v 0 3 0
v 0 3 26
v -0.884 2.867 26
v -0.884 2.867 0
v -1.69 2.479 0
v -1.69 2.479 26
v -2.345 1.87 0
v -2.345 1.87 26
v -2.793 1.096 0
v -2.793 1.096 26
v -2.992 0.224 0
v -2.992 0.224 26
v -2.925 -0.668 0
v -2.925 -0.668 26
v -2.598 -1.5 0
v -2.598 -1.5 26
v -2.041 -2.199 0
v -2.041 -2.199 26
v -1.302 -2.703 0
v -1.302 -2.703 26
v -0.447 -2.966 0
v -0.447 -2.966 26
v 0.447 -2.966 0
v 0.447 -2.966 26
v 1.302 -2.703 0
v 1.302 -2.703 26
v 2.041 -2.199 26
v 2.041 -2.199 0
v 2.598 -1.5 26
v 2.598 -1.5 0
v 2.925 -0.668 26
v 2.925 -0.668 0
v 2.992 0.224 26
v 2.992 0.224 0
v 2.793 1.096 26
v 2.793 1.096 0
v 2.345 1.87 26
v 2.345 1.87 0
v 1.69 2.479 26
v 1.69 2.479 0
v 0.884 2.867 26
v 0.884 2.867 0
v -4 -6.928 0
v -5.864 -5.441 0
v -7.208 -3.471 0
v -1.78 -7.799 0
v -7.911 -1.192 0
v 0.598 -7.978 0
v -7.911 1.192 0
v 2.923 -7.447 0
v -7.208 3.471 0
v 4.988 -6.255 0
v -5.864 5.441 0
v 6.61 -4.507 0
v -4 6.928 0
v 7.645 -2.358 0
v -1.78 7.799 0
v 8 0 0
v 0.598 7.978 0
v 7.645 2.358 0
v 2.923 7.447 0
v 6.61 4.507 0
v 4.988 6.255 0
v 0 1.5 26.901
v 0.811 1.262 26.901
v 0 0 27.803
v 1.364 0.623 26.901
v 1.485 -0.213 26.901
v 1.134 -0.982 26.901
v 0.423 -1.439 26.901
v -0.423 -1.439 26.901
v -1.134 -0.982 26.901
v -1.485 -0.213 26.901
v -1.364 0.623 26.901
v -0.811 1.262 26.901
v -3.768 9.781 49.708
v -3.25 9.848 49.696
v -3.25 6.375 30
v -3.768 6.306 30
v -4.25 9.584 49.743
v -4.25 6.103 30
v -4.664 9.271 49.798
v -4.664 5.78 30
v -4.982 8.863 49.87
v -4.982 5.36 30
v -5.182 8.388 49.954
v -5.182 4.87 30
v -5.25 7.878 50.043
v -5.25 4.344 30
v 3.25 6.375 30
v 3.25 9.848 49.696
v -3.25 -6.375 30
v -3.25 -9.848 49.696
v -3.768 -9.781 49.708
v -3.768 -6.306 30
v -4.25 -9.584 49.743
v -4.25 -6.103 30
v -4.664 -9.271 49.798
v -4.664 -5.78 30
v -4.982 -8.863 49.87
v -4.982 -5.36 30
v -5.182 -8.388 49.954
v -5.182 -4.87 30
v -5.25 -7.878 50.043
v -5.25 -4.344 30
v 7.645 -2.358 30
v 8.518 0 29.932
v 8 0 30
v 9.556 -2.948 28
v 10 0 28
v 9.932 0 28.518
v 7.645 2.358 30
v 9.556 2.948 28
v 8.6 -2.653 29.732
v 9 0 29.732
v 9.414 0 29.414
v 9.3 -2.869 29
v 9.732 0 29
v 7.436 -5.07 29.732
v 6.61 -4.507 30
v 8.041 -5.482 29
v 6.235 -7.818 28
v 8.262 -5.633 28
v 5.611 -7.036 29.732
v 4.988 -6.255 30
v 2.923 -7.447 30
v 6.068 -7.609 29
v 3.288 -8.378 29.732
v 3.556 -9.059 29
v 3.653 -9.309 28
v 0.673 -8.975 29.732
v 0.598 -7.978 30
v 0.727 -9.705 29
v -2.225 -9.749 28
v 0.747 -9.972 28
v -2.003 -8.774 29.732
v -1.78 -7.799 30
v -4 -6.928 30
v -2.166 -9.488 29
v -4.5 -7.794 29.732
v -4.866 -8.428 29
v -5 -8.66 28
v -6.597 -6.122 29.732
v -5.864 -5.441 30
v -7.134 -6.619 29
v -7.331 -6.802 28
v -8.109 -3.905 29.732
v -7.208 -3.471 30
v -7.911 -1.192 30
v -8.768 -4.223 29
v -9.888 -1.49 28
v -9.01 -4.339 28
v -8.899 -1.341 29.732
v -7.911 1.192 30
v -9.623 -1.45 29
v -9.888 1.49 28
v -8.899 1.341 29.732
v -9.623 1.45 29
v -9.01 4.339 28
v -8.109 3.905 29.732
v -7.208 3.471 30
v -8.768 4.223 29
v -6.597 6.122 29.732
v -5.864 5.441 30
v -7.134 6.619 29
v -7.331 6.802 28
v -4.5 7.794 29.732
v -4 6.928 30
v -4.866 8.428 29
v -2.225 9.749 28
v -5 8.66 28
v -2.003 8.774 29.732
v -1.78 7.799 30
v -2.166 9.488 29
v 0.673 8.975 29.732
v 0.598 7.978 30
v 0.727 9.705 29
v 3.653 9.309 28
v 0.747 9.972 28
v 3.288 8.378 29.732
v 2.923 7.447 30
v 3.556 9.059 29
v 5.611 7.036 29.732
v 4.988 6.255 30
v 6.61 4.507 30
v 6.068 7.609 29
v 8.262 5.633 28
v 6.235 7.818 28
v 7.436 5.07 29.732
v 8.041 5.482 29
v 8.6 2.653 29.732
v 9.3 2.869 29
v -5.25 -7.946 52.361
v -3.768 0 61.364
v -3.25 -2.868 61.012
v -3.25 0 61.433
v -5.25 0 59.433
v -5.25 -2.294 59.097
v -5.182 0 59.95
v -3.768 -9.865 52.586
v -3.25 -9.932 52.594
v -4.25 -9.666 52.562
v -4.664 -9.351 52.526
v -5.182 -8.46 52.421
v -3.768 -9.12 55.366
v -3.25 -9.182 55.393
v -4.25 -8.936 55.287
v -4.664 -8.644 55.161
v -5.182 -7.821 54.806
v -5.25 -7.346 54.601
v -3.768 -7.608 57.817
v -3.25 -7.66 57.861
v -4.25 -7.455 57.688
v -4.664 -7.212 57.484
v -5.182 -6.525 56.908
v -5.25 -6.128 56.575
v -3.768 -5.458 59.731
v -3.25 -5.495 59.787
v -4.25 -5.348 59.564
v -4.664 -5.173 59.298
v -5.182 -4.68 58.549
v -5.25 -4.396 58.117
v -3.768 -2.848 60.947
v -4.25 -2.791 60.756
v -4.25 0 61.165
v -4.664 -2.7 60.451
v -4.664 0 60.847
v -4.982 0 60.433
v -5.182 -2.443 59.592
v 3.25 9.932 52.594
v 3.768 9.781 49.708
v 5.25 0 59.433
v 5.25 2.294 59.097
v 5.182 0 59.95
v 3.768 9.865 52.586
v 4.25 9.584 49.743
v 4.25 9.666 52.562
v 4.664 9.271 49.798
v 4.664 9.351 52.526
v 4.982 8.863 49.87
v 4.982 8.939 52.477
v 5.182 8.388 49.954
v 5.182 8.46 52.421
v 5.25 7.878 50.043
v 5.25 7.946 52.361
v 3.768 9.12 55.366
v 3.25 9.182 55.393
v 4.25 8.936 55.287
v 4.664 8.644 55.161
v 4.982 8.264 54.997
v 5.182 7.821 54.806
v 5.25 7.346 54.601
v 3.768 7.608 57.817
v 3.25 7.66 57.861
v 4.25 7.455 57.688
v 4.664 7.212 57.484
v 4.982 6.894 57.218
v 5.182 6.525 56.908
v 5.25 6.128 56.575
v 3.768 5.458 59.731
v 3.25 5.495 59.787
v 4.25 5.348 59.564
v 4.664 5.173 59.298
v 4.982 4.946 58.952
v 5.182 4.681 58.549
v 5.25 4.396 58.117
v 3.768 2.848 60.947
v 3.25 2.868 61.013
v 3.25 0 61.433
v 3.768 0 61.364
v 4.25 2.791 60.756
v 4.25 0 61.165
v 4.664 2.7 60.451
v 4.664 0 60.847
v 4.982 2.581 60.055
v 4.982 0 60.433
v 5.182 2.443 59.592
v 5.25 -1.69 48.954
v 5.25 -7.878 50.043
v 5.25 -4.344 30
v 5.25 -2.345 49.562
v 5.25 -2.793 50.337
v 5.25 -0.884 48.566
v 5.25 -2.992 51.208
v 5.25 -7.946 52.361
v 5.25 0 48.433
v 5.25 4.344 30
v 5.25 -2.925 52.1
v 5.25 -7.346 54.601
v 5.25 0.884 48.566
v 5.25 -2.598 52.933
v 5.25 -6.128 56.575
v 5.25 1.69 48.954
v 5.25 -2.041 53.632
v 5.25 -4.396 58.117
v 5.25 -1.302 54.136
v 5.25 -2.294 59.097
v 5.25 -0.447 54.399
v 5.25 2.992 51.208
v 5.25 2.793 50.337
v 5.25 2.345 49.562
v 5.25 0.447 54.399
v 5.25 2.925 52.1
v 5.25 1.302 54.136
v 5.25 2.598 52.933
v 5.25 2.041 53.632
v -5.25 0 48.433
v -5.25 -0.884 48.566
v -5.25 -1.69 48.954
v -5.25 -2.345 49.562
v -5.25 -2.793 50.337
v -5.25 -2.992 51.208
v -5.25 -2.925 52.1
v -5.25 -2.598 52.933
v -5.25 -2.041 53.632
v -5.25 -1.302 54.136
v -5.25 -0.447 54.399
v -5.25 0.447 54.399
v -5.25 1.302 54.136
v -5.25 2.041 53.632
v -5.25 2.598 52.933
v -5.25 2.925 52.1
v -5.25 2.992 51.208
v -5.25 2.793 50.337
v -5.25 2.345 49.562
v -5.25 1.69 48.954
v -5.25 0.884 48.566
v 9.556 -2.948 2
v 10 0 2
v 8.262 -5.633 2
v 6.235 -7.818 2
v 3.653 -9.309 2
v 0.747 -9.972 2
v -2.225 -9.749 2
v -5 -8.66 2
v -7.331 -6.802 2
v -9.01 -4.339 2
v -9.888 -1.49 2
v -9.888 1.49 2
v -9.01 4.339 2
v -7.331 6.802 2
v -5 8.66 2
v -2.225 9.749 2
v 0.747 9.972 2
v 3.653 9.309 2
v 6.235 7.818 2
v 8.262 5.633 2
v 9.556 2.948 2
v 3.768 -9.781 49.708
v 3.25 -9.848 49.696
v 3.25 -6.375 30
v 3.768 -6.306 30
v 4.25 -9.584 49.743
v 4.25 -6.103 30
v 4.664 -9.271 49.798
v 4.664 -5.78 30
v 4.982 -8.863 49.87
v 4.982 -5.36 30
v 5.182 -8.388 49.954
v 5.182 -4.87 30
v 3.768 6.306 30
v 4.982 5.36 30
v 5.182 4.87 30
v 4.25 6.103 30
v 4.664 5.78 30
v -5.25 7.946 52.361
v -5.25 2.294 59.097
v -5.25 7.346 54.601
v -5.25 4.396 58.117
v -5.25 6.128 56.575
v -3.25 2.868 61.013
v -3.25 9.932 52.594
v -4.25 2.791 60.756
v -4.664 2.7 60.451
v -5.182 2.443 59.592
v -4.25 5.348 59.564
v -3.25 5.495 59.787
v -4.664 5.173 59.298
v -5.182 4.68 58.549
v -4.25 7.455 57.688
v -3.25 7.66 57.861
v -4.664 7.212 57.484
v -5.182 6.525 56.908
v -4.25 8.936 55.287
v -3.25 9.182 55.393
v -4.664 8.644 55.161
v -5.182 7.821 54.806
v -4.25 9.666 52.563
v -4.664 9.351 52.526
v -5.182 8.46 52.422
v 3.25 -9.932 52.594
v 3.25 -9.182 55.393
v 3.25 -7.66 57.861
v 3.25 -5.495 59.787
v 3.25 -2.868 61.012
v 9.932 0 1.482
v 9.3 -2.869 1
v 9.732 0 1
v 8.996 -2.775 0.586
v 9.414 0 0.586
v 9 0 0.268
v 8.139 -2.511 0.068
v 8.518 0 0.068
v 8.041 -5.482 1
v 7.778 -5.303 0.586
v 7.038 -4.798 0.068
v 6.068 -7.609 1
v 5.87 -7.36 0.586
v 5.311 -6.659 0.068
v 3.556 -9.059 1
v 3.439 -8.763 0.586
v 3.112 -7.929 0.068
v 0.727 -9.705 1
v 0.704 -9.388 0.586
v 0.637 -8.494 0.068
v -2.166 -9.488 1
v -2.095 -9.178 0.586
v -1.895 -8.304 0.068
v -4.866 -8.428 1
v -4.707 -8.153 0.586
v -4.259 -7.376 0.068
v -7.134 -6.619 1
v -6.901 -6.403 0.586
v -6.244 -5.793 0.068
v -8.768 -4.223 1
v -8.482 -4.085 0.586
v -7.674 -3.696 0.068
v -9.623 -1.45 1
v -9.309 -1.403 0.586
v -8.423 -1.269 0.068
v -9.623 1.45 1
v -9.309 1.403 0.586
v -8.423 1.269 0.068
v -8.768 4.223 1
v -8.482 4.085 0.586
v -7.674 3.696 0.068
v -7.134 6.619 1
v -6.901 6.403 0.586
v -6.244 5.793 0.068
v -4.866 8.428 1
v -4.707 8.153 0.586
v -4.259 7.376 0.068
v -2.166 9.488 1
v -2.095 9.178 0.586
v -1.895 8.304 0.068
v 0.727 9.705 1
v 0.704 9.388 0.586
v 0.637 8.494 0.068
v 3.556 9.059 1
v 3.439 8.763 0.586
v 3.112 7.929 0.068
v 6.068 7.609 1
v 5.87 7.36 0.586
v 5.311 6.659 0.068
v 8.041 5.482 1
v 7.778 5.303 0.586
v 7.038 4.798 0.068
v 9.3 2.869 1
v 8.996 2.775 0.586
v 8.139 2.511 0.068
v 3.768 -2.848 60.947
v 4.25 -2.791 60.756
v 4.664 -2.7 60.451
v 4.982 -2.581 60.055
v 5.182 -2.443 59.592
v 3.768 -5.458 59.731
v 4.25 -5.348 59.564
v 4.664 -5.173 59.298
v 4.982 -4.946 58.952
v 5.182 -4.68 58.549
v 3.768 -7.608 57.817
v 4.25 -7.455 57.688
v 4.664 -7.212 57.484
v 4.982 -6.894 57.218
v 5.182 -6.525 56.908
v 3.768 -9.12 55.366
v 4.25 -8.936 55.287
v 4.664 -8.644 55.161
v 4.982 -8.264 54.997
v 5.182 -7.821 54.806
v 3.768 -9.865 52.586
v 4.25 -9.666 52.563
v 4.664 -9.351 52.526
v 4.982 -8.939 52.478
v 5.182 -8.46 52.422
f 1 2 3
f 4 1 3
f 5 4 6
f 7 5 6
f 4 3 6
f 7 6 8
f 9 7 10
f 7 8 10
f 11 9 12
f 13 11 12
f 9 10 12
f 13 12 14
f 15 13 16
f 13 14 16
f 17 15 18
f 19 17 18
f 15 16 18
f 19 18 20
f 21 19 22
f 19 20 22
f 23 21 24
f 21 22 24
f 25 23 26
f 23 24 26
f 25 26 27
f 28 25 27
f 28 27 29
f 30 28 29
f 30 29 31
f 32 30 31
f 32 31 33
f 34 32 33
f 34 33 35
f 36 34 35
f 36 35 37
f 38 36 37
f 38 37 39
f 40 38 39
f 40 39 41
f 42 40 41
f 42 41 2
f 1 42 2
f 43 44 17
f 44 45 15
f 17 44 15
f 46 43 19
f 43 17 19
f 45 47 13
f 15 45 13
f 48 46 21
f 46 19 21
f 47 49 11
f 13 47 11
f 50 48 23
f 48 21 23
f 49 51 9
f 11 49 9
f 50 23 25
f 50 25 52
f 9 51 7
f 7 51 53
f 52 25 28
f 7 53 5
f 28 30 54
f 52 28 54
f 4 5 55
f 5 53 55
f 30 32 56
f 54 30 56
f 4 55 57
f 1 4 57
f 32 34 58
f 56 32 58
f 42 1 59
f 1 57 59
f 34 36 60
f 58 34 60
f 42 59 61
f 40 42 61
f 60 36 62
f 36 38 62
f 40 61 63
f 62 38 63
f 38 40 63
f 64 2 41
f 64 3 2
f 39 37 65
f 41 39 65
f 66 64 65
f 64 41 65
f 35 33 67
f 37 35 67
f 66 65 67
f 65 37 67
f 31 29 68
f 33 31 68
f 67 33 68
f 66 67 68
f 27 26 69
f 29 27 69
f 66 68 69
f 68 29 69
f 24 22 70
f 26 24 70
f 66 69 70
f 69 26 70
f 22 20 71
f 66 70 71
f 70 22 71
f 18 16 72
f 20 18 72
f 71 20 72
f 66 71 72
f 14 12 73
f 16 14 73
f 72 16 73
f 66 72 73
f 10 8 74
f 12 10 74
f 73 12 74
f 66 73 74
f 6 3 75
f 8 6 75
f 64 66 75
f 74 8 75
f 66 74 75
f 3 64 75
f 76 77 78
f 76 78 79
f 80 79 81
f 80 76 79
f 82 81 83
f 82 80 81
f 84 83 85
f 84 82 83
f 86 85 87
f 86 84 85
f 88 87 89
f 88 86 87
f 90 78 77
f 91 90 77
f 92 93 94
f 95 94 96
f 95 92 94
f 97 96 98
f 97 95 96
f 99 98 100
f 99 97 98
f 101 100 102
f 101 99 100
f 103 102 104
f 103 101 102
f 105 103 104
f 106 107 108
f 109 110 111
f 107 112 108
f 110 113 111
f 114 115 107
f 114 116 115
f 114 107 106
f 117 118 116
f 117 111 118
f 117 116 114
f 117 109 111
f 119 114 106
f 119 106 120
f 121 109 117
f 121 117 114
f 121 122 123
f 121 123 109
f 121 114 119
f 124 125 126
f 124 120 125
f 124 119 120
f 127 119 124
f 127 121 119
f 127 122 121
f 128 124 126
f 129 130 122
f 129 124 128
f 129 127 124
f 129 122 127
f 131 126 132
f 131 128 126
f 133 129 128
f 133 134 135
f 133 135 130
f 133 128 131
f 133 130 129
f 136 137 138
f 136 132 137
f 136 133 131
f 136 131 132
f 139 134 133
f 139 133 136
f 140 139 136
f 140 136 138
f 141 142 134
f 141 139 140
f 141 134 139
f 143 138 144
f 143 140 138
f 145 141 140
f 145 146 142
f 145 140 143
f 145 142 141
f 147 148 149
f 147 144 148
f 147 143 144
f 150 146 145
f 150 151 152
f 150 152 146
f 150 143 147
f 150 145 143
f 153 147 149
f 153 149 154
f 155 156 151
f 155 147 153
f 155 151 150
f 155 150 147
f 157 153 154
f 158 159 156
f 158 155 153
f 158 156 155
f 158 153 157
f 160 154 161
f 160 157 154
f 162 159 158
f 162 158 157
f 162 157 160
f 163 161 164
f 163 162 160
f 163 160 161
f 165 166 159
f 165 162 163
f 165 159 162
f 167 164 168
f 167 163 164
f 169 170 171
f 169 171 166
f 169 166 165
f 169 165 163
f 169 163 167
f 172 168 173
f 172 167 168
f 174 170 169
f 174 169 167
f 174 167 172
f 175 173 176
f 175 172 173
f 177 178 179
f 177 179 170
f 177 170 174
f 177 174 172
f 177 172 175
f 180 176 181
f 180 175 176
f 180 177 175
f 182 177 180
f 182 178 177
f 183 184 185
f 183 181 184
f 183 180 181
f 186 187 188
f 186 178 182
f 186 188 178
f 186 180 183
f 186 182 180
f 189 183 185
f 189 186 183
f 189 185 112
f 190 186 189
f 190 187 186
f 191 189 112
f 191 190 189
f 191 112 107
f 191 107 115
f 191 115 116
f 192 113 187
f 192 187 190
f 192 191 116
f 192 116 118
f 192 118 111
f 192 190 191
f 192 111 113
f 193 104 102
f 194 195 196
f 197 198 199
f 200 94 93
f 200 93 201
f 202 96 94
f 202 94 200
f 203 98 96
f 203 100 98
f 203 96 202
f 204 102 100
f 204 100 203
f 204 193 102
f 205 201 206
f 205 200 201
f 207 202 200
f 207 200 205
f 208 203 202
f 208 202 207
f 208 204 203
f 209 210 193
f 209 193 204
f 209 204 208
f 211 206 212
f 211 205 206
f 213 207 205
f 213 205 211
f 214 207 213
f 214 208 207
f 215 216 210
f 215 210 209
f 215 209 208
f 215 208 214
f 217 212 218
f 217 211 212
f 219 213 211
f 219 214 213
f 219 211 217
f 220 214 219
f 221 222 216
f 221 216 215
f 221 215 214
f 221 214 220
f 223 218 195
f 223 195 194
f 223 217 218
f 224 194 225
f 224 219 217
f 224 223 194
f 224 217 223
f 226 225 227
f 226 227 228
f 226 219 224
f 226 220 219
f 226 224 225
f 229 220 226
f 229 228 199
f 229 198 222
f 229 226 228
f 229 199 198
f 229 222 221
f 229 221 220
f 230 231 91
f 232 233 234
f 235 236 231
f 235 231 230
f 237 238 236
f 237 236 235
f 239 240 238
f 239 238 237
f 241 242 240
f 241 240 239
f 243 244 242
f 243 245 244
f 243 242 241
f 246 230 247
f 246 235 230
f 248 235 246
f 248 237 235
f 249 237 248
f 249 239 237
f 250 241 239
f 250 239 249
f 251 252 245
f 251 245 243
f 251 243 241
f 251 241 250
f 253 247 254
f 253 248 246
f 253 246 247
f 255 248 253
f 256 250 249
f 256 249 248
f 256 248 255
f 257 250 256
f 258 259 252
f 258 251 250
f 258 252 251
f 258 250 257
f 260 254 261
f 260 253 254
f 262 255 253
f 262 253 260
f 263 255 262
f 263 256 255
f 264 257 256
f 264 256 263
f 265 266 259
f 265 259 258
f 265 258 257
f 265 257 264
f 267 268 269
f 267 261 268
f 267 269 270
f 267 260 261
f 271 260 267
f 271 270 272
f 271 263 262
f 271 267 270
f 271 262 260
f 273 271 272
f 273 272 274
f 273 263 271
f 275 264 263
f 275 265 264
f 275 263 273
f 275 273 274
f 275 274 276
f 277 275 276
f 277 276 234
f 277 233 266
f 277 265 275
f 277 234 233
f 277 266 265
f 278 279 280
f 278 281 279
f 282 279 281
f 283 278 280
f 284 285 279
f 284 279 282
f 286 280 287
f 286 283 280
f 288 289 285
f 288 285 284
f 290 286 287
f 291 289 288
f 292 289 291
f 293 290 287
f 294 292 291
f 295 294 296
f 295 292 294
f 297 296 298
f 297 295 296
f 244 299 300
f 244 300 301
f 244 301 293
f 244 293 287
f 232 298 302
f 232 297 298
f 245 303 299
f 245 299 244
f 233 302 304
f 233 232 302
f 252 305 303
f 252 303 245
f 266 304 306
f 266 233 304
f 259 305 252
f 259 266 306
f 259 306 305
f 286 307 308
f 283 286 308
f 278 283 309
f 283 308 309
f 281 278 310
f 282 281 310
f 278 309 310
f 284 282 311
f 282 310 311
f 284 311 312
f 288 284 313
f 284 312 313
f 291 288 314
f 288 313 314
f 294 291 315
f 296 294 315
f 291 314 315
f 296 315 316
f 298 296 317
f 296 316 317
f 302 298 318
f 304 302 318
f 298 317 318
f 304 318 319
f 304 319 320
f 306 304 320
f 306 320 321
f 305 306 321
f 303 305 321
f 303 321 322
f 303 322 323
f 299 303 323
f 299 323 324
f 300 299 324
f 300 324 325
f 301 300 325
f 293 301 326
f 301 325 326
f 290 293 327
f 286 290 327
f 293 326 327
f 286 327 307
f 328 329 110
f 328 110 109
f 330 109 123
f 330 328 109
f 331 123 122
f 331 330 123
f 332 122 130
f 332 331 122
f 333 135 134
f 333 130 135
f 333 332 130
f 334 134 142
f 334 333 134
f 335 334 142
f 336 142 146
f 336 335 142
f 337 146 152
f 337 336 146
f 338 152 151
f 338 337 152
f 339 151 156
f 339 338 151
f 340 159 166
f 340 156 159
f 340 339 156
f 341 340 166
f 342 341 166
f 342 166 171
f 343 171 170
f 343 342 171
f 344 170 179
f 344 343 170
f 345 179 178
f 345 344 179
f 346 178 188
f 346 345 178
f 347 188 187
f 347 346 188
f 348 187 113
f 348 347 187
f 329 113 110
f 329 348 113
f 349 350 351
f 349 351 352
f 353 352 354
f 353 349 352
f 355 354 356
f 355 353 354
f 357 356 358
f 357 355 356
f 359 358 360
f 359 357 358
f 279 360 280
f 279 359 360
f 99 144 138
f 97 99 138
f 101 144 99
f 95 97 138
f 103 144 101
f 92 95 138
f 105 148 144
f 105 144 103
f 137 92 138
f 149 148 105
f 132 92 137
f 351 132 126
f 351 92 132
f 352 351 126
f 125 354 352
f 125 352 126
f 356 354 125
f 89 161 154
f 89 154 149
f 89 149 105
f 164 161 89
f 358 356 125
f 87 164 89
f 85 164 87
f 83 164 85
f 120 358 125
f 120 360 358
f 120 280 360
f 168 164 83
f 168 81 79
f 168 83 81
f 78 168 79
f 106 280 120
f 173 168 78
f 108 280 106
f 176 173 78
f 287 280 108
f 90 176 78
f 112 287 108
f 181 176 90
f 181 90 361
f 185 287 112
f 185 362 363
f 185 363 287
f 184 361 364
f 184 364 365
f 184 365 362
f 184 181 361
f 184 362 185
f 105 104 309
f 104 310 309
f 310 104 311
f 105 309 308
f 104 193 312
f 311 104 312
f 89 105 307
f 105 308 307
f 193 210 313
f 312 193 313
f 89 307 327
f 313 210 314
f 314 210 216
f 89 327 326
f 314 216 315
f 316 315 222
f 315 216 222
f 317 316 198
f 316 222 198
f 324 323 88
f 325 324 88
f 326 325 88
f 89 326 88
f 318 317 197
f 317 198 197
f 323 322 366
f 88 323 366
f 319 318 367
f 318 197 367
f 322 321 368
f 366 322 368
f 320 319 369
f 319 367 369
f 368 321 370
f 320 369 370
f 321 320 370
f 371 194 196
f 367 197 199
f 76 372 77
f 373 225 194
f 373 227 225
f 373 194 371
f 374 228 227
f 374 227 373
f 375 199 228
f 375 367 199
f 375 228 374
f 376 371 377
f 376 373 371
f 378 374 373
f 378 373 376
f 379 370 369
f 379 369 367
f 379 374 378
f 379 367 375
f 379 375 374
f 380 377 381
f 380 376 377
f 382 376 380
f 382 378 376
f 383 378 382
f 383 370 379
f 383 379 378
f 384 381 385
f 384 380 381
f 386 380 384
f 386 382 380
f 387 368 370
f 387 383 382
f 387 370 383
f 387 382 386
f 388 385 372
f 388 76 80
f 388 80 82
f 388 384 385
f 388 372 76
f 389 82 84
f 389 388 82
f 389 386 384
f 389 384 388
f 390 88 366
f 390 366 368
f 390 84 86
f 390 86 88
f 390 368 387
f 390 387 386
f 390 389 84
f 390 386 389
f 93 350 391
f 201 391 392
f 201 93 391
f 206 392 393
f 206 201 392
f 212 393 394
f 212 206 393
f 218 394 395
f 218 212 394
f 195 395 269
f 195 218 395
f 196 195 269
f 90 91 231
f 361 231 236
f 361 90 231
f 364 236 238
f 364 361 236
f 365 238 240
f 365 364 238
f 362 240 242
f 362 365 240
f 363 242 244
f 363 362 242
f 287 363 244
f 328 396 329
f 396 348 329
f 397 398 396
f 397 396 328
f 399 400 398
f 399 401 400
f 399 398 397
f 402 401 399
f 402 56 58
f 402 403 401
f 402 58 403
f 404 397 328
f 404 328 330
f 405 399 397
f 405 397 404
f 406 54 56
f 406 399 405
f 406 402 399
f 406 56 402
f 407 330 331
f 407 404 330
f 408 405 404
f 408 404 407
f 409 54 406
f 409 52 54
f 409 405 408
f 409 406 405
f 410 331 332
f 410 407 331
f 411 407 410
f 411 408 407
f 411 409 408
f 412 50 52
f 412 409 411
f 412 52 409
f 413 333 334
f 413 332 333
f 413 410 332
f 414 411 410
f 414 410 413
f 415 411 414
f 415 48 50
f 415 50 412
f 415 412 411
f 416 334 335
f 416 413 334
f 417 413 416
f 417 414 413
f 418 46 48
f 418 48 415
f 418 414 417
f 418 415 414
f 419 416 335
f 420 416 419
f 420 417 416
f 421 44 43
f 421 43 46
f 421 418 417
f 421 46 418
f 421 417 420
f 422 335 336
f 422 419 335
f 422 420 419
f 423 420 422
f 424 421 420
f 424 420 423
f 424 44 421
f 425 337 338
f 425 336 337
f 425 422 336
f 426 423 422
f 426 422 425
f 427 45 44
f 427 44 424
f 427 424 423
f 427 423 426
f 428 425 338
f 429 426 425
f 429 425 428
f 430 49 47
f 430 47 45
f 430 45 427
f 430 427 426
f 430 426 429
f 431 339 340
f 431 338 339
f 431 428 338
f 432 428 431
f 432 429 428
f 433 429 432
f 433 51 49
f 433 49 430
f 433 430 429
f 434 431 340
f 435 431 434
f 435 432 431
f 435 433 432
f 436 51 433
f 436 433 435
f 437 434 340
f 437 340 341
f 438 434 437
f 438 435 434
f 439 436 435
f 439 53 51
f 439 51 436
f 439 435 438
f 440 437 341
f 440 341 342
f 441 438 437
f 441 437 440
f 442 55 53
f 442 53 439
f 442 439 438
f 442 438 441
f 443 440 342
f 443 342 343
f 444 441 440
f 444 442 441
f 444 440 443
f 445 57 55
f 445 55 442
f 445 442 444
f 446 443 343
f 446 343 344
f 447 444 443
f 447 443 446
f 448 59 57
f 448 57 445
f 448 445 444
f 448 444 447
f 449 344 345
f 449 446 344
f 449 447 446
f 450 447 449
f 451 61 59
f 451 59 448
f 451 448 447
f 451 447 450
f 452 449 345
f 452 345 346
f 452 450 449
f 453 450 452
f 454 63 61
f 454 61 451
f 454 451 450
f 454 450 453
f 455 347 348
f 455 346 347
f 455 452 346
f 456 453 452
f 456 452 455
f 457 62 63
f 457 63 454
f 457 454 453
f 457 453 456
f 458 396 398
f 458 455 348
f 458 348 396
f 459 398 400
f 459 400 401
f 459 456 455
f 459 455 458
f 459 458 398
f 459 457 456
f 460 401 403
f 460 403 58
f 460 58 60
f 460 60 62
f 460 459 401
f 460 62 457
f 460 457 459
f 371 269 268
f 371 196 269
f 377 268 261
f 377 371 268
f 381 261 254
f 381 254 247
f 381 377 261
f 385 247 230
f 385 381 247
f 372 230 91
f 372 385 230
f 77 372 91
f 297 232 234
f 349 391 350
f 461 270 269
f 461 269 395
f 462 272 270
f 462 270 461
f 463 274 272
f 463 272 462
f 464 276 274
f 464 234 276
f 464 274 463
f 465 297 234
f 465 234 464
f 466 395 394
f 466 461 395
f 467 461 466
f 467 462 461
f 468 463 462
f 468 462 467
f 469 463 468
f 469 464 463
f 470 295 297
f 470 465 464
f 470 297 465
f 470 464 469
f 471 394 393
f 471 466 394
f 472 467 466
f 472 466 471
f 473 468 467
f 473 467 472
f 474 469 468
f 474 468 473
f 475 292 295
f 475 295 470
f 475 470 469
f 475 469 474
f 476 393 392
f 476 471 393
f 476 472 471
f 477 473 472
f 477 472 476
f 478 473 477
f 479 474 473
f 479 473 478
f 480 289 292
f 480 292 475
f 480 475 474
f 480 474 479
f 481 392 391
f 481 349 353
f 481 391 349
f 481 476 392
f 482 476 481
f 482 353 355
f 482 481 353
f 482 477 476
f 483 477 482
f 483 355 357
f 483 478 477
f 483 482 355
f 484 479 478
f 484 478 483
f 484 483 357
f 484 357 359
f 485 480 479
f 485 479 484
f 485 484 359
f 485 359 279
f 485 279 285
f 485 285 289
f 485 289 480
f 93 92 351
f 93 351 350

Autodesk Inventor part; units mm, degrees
ref_plane "YZ Plane" through (0, 0, 0) normal (1, 0, 0) x (0, 1, 0)
ref_plane "XZ Plane" through (0, 0, 0) normal (0, 1, 0) x (-1, 0, 0)
ref_plane "XY Plane" through (0, 0, 0) normal (0, 0, 1) x (1, 0, 0)
sketch "Boceto1" plane through (0, 0, 0) normal (0, 0, 1) x (1, 0, 0)
  circle A0 centre (0, 0) radius 10
  dimension "d0" = 20
extrude "Extrusión1" add sketch "Boceto1" along normal blind 30
sketch "Boceto2" plane through (0, 0, 0) normal (1, 0, 0) x (0, 1, 0)
  line L0 (10, 30) -> (-10, 30) projected
  line L1 (-10, 0) -> (10, 0) projected
  line L2 (10, 30) -> (-10, 30) projected
  line L3 (6.3751, 30) -> (9.8481, 49.6962)
  arc A0 (9.8481, 49.6962) -> (0, 61.4326) centre (0, 51.4326) ccw
  line L4 (0, 73.9906) -> (0, 23.9809)
  line L5 (-6.3751, 30) -> (-9.8481, 49.6962)
  arc A1 (0, 61.4326) -> (-9.8481, 49.6962) centre (0, 51.4326) ccw
  line L6 (6.3751, 30) -> (-6.3751, 30)
  point P0 (0, 0)
  point P1 (0, 30)
  dimension "d3" = 10
  dimension "d4" = 20
  dimension "d5" = 100
extrude "Extrusión2" add sketch "Boceto2" along normal mid plane 10.5
hole "Agujero1" at (5.25, 0, 51.4326) direction (-1, 0, 0) diameter 6 end through all
hole "Agujero2" at (0, 0, 0) direction (0, 0, 1) diameter 6 depth 26 tip angle 118
fillet "Empalme1" radius 2 8 edges at (5.25, -8.1116, 39.8481) (5.25, 8.1116, 39.8481) (5.25, -7.6604, 57.8605) (-5.25, 8.1116, 39.8481) (-5.25, -8.1116, 39.8481) (-5.25, 7.6604, 57.8605) (-10, 0, 30) (-10, 0, 0)
properties part number "wheel_shock_end"
